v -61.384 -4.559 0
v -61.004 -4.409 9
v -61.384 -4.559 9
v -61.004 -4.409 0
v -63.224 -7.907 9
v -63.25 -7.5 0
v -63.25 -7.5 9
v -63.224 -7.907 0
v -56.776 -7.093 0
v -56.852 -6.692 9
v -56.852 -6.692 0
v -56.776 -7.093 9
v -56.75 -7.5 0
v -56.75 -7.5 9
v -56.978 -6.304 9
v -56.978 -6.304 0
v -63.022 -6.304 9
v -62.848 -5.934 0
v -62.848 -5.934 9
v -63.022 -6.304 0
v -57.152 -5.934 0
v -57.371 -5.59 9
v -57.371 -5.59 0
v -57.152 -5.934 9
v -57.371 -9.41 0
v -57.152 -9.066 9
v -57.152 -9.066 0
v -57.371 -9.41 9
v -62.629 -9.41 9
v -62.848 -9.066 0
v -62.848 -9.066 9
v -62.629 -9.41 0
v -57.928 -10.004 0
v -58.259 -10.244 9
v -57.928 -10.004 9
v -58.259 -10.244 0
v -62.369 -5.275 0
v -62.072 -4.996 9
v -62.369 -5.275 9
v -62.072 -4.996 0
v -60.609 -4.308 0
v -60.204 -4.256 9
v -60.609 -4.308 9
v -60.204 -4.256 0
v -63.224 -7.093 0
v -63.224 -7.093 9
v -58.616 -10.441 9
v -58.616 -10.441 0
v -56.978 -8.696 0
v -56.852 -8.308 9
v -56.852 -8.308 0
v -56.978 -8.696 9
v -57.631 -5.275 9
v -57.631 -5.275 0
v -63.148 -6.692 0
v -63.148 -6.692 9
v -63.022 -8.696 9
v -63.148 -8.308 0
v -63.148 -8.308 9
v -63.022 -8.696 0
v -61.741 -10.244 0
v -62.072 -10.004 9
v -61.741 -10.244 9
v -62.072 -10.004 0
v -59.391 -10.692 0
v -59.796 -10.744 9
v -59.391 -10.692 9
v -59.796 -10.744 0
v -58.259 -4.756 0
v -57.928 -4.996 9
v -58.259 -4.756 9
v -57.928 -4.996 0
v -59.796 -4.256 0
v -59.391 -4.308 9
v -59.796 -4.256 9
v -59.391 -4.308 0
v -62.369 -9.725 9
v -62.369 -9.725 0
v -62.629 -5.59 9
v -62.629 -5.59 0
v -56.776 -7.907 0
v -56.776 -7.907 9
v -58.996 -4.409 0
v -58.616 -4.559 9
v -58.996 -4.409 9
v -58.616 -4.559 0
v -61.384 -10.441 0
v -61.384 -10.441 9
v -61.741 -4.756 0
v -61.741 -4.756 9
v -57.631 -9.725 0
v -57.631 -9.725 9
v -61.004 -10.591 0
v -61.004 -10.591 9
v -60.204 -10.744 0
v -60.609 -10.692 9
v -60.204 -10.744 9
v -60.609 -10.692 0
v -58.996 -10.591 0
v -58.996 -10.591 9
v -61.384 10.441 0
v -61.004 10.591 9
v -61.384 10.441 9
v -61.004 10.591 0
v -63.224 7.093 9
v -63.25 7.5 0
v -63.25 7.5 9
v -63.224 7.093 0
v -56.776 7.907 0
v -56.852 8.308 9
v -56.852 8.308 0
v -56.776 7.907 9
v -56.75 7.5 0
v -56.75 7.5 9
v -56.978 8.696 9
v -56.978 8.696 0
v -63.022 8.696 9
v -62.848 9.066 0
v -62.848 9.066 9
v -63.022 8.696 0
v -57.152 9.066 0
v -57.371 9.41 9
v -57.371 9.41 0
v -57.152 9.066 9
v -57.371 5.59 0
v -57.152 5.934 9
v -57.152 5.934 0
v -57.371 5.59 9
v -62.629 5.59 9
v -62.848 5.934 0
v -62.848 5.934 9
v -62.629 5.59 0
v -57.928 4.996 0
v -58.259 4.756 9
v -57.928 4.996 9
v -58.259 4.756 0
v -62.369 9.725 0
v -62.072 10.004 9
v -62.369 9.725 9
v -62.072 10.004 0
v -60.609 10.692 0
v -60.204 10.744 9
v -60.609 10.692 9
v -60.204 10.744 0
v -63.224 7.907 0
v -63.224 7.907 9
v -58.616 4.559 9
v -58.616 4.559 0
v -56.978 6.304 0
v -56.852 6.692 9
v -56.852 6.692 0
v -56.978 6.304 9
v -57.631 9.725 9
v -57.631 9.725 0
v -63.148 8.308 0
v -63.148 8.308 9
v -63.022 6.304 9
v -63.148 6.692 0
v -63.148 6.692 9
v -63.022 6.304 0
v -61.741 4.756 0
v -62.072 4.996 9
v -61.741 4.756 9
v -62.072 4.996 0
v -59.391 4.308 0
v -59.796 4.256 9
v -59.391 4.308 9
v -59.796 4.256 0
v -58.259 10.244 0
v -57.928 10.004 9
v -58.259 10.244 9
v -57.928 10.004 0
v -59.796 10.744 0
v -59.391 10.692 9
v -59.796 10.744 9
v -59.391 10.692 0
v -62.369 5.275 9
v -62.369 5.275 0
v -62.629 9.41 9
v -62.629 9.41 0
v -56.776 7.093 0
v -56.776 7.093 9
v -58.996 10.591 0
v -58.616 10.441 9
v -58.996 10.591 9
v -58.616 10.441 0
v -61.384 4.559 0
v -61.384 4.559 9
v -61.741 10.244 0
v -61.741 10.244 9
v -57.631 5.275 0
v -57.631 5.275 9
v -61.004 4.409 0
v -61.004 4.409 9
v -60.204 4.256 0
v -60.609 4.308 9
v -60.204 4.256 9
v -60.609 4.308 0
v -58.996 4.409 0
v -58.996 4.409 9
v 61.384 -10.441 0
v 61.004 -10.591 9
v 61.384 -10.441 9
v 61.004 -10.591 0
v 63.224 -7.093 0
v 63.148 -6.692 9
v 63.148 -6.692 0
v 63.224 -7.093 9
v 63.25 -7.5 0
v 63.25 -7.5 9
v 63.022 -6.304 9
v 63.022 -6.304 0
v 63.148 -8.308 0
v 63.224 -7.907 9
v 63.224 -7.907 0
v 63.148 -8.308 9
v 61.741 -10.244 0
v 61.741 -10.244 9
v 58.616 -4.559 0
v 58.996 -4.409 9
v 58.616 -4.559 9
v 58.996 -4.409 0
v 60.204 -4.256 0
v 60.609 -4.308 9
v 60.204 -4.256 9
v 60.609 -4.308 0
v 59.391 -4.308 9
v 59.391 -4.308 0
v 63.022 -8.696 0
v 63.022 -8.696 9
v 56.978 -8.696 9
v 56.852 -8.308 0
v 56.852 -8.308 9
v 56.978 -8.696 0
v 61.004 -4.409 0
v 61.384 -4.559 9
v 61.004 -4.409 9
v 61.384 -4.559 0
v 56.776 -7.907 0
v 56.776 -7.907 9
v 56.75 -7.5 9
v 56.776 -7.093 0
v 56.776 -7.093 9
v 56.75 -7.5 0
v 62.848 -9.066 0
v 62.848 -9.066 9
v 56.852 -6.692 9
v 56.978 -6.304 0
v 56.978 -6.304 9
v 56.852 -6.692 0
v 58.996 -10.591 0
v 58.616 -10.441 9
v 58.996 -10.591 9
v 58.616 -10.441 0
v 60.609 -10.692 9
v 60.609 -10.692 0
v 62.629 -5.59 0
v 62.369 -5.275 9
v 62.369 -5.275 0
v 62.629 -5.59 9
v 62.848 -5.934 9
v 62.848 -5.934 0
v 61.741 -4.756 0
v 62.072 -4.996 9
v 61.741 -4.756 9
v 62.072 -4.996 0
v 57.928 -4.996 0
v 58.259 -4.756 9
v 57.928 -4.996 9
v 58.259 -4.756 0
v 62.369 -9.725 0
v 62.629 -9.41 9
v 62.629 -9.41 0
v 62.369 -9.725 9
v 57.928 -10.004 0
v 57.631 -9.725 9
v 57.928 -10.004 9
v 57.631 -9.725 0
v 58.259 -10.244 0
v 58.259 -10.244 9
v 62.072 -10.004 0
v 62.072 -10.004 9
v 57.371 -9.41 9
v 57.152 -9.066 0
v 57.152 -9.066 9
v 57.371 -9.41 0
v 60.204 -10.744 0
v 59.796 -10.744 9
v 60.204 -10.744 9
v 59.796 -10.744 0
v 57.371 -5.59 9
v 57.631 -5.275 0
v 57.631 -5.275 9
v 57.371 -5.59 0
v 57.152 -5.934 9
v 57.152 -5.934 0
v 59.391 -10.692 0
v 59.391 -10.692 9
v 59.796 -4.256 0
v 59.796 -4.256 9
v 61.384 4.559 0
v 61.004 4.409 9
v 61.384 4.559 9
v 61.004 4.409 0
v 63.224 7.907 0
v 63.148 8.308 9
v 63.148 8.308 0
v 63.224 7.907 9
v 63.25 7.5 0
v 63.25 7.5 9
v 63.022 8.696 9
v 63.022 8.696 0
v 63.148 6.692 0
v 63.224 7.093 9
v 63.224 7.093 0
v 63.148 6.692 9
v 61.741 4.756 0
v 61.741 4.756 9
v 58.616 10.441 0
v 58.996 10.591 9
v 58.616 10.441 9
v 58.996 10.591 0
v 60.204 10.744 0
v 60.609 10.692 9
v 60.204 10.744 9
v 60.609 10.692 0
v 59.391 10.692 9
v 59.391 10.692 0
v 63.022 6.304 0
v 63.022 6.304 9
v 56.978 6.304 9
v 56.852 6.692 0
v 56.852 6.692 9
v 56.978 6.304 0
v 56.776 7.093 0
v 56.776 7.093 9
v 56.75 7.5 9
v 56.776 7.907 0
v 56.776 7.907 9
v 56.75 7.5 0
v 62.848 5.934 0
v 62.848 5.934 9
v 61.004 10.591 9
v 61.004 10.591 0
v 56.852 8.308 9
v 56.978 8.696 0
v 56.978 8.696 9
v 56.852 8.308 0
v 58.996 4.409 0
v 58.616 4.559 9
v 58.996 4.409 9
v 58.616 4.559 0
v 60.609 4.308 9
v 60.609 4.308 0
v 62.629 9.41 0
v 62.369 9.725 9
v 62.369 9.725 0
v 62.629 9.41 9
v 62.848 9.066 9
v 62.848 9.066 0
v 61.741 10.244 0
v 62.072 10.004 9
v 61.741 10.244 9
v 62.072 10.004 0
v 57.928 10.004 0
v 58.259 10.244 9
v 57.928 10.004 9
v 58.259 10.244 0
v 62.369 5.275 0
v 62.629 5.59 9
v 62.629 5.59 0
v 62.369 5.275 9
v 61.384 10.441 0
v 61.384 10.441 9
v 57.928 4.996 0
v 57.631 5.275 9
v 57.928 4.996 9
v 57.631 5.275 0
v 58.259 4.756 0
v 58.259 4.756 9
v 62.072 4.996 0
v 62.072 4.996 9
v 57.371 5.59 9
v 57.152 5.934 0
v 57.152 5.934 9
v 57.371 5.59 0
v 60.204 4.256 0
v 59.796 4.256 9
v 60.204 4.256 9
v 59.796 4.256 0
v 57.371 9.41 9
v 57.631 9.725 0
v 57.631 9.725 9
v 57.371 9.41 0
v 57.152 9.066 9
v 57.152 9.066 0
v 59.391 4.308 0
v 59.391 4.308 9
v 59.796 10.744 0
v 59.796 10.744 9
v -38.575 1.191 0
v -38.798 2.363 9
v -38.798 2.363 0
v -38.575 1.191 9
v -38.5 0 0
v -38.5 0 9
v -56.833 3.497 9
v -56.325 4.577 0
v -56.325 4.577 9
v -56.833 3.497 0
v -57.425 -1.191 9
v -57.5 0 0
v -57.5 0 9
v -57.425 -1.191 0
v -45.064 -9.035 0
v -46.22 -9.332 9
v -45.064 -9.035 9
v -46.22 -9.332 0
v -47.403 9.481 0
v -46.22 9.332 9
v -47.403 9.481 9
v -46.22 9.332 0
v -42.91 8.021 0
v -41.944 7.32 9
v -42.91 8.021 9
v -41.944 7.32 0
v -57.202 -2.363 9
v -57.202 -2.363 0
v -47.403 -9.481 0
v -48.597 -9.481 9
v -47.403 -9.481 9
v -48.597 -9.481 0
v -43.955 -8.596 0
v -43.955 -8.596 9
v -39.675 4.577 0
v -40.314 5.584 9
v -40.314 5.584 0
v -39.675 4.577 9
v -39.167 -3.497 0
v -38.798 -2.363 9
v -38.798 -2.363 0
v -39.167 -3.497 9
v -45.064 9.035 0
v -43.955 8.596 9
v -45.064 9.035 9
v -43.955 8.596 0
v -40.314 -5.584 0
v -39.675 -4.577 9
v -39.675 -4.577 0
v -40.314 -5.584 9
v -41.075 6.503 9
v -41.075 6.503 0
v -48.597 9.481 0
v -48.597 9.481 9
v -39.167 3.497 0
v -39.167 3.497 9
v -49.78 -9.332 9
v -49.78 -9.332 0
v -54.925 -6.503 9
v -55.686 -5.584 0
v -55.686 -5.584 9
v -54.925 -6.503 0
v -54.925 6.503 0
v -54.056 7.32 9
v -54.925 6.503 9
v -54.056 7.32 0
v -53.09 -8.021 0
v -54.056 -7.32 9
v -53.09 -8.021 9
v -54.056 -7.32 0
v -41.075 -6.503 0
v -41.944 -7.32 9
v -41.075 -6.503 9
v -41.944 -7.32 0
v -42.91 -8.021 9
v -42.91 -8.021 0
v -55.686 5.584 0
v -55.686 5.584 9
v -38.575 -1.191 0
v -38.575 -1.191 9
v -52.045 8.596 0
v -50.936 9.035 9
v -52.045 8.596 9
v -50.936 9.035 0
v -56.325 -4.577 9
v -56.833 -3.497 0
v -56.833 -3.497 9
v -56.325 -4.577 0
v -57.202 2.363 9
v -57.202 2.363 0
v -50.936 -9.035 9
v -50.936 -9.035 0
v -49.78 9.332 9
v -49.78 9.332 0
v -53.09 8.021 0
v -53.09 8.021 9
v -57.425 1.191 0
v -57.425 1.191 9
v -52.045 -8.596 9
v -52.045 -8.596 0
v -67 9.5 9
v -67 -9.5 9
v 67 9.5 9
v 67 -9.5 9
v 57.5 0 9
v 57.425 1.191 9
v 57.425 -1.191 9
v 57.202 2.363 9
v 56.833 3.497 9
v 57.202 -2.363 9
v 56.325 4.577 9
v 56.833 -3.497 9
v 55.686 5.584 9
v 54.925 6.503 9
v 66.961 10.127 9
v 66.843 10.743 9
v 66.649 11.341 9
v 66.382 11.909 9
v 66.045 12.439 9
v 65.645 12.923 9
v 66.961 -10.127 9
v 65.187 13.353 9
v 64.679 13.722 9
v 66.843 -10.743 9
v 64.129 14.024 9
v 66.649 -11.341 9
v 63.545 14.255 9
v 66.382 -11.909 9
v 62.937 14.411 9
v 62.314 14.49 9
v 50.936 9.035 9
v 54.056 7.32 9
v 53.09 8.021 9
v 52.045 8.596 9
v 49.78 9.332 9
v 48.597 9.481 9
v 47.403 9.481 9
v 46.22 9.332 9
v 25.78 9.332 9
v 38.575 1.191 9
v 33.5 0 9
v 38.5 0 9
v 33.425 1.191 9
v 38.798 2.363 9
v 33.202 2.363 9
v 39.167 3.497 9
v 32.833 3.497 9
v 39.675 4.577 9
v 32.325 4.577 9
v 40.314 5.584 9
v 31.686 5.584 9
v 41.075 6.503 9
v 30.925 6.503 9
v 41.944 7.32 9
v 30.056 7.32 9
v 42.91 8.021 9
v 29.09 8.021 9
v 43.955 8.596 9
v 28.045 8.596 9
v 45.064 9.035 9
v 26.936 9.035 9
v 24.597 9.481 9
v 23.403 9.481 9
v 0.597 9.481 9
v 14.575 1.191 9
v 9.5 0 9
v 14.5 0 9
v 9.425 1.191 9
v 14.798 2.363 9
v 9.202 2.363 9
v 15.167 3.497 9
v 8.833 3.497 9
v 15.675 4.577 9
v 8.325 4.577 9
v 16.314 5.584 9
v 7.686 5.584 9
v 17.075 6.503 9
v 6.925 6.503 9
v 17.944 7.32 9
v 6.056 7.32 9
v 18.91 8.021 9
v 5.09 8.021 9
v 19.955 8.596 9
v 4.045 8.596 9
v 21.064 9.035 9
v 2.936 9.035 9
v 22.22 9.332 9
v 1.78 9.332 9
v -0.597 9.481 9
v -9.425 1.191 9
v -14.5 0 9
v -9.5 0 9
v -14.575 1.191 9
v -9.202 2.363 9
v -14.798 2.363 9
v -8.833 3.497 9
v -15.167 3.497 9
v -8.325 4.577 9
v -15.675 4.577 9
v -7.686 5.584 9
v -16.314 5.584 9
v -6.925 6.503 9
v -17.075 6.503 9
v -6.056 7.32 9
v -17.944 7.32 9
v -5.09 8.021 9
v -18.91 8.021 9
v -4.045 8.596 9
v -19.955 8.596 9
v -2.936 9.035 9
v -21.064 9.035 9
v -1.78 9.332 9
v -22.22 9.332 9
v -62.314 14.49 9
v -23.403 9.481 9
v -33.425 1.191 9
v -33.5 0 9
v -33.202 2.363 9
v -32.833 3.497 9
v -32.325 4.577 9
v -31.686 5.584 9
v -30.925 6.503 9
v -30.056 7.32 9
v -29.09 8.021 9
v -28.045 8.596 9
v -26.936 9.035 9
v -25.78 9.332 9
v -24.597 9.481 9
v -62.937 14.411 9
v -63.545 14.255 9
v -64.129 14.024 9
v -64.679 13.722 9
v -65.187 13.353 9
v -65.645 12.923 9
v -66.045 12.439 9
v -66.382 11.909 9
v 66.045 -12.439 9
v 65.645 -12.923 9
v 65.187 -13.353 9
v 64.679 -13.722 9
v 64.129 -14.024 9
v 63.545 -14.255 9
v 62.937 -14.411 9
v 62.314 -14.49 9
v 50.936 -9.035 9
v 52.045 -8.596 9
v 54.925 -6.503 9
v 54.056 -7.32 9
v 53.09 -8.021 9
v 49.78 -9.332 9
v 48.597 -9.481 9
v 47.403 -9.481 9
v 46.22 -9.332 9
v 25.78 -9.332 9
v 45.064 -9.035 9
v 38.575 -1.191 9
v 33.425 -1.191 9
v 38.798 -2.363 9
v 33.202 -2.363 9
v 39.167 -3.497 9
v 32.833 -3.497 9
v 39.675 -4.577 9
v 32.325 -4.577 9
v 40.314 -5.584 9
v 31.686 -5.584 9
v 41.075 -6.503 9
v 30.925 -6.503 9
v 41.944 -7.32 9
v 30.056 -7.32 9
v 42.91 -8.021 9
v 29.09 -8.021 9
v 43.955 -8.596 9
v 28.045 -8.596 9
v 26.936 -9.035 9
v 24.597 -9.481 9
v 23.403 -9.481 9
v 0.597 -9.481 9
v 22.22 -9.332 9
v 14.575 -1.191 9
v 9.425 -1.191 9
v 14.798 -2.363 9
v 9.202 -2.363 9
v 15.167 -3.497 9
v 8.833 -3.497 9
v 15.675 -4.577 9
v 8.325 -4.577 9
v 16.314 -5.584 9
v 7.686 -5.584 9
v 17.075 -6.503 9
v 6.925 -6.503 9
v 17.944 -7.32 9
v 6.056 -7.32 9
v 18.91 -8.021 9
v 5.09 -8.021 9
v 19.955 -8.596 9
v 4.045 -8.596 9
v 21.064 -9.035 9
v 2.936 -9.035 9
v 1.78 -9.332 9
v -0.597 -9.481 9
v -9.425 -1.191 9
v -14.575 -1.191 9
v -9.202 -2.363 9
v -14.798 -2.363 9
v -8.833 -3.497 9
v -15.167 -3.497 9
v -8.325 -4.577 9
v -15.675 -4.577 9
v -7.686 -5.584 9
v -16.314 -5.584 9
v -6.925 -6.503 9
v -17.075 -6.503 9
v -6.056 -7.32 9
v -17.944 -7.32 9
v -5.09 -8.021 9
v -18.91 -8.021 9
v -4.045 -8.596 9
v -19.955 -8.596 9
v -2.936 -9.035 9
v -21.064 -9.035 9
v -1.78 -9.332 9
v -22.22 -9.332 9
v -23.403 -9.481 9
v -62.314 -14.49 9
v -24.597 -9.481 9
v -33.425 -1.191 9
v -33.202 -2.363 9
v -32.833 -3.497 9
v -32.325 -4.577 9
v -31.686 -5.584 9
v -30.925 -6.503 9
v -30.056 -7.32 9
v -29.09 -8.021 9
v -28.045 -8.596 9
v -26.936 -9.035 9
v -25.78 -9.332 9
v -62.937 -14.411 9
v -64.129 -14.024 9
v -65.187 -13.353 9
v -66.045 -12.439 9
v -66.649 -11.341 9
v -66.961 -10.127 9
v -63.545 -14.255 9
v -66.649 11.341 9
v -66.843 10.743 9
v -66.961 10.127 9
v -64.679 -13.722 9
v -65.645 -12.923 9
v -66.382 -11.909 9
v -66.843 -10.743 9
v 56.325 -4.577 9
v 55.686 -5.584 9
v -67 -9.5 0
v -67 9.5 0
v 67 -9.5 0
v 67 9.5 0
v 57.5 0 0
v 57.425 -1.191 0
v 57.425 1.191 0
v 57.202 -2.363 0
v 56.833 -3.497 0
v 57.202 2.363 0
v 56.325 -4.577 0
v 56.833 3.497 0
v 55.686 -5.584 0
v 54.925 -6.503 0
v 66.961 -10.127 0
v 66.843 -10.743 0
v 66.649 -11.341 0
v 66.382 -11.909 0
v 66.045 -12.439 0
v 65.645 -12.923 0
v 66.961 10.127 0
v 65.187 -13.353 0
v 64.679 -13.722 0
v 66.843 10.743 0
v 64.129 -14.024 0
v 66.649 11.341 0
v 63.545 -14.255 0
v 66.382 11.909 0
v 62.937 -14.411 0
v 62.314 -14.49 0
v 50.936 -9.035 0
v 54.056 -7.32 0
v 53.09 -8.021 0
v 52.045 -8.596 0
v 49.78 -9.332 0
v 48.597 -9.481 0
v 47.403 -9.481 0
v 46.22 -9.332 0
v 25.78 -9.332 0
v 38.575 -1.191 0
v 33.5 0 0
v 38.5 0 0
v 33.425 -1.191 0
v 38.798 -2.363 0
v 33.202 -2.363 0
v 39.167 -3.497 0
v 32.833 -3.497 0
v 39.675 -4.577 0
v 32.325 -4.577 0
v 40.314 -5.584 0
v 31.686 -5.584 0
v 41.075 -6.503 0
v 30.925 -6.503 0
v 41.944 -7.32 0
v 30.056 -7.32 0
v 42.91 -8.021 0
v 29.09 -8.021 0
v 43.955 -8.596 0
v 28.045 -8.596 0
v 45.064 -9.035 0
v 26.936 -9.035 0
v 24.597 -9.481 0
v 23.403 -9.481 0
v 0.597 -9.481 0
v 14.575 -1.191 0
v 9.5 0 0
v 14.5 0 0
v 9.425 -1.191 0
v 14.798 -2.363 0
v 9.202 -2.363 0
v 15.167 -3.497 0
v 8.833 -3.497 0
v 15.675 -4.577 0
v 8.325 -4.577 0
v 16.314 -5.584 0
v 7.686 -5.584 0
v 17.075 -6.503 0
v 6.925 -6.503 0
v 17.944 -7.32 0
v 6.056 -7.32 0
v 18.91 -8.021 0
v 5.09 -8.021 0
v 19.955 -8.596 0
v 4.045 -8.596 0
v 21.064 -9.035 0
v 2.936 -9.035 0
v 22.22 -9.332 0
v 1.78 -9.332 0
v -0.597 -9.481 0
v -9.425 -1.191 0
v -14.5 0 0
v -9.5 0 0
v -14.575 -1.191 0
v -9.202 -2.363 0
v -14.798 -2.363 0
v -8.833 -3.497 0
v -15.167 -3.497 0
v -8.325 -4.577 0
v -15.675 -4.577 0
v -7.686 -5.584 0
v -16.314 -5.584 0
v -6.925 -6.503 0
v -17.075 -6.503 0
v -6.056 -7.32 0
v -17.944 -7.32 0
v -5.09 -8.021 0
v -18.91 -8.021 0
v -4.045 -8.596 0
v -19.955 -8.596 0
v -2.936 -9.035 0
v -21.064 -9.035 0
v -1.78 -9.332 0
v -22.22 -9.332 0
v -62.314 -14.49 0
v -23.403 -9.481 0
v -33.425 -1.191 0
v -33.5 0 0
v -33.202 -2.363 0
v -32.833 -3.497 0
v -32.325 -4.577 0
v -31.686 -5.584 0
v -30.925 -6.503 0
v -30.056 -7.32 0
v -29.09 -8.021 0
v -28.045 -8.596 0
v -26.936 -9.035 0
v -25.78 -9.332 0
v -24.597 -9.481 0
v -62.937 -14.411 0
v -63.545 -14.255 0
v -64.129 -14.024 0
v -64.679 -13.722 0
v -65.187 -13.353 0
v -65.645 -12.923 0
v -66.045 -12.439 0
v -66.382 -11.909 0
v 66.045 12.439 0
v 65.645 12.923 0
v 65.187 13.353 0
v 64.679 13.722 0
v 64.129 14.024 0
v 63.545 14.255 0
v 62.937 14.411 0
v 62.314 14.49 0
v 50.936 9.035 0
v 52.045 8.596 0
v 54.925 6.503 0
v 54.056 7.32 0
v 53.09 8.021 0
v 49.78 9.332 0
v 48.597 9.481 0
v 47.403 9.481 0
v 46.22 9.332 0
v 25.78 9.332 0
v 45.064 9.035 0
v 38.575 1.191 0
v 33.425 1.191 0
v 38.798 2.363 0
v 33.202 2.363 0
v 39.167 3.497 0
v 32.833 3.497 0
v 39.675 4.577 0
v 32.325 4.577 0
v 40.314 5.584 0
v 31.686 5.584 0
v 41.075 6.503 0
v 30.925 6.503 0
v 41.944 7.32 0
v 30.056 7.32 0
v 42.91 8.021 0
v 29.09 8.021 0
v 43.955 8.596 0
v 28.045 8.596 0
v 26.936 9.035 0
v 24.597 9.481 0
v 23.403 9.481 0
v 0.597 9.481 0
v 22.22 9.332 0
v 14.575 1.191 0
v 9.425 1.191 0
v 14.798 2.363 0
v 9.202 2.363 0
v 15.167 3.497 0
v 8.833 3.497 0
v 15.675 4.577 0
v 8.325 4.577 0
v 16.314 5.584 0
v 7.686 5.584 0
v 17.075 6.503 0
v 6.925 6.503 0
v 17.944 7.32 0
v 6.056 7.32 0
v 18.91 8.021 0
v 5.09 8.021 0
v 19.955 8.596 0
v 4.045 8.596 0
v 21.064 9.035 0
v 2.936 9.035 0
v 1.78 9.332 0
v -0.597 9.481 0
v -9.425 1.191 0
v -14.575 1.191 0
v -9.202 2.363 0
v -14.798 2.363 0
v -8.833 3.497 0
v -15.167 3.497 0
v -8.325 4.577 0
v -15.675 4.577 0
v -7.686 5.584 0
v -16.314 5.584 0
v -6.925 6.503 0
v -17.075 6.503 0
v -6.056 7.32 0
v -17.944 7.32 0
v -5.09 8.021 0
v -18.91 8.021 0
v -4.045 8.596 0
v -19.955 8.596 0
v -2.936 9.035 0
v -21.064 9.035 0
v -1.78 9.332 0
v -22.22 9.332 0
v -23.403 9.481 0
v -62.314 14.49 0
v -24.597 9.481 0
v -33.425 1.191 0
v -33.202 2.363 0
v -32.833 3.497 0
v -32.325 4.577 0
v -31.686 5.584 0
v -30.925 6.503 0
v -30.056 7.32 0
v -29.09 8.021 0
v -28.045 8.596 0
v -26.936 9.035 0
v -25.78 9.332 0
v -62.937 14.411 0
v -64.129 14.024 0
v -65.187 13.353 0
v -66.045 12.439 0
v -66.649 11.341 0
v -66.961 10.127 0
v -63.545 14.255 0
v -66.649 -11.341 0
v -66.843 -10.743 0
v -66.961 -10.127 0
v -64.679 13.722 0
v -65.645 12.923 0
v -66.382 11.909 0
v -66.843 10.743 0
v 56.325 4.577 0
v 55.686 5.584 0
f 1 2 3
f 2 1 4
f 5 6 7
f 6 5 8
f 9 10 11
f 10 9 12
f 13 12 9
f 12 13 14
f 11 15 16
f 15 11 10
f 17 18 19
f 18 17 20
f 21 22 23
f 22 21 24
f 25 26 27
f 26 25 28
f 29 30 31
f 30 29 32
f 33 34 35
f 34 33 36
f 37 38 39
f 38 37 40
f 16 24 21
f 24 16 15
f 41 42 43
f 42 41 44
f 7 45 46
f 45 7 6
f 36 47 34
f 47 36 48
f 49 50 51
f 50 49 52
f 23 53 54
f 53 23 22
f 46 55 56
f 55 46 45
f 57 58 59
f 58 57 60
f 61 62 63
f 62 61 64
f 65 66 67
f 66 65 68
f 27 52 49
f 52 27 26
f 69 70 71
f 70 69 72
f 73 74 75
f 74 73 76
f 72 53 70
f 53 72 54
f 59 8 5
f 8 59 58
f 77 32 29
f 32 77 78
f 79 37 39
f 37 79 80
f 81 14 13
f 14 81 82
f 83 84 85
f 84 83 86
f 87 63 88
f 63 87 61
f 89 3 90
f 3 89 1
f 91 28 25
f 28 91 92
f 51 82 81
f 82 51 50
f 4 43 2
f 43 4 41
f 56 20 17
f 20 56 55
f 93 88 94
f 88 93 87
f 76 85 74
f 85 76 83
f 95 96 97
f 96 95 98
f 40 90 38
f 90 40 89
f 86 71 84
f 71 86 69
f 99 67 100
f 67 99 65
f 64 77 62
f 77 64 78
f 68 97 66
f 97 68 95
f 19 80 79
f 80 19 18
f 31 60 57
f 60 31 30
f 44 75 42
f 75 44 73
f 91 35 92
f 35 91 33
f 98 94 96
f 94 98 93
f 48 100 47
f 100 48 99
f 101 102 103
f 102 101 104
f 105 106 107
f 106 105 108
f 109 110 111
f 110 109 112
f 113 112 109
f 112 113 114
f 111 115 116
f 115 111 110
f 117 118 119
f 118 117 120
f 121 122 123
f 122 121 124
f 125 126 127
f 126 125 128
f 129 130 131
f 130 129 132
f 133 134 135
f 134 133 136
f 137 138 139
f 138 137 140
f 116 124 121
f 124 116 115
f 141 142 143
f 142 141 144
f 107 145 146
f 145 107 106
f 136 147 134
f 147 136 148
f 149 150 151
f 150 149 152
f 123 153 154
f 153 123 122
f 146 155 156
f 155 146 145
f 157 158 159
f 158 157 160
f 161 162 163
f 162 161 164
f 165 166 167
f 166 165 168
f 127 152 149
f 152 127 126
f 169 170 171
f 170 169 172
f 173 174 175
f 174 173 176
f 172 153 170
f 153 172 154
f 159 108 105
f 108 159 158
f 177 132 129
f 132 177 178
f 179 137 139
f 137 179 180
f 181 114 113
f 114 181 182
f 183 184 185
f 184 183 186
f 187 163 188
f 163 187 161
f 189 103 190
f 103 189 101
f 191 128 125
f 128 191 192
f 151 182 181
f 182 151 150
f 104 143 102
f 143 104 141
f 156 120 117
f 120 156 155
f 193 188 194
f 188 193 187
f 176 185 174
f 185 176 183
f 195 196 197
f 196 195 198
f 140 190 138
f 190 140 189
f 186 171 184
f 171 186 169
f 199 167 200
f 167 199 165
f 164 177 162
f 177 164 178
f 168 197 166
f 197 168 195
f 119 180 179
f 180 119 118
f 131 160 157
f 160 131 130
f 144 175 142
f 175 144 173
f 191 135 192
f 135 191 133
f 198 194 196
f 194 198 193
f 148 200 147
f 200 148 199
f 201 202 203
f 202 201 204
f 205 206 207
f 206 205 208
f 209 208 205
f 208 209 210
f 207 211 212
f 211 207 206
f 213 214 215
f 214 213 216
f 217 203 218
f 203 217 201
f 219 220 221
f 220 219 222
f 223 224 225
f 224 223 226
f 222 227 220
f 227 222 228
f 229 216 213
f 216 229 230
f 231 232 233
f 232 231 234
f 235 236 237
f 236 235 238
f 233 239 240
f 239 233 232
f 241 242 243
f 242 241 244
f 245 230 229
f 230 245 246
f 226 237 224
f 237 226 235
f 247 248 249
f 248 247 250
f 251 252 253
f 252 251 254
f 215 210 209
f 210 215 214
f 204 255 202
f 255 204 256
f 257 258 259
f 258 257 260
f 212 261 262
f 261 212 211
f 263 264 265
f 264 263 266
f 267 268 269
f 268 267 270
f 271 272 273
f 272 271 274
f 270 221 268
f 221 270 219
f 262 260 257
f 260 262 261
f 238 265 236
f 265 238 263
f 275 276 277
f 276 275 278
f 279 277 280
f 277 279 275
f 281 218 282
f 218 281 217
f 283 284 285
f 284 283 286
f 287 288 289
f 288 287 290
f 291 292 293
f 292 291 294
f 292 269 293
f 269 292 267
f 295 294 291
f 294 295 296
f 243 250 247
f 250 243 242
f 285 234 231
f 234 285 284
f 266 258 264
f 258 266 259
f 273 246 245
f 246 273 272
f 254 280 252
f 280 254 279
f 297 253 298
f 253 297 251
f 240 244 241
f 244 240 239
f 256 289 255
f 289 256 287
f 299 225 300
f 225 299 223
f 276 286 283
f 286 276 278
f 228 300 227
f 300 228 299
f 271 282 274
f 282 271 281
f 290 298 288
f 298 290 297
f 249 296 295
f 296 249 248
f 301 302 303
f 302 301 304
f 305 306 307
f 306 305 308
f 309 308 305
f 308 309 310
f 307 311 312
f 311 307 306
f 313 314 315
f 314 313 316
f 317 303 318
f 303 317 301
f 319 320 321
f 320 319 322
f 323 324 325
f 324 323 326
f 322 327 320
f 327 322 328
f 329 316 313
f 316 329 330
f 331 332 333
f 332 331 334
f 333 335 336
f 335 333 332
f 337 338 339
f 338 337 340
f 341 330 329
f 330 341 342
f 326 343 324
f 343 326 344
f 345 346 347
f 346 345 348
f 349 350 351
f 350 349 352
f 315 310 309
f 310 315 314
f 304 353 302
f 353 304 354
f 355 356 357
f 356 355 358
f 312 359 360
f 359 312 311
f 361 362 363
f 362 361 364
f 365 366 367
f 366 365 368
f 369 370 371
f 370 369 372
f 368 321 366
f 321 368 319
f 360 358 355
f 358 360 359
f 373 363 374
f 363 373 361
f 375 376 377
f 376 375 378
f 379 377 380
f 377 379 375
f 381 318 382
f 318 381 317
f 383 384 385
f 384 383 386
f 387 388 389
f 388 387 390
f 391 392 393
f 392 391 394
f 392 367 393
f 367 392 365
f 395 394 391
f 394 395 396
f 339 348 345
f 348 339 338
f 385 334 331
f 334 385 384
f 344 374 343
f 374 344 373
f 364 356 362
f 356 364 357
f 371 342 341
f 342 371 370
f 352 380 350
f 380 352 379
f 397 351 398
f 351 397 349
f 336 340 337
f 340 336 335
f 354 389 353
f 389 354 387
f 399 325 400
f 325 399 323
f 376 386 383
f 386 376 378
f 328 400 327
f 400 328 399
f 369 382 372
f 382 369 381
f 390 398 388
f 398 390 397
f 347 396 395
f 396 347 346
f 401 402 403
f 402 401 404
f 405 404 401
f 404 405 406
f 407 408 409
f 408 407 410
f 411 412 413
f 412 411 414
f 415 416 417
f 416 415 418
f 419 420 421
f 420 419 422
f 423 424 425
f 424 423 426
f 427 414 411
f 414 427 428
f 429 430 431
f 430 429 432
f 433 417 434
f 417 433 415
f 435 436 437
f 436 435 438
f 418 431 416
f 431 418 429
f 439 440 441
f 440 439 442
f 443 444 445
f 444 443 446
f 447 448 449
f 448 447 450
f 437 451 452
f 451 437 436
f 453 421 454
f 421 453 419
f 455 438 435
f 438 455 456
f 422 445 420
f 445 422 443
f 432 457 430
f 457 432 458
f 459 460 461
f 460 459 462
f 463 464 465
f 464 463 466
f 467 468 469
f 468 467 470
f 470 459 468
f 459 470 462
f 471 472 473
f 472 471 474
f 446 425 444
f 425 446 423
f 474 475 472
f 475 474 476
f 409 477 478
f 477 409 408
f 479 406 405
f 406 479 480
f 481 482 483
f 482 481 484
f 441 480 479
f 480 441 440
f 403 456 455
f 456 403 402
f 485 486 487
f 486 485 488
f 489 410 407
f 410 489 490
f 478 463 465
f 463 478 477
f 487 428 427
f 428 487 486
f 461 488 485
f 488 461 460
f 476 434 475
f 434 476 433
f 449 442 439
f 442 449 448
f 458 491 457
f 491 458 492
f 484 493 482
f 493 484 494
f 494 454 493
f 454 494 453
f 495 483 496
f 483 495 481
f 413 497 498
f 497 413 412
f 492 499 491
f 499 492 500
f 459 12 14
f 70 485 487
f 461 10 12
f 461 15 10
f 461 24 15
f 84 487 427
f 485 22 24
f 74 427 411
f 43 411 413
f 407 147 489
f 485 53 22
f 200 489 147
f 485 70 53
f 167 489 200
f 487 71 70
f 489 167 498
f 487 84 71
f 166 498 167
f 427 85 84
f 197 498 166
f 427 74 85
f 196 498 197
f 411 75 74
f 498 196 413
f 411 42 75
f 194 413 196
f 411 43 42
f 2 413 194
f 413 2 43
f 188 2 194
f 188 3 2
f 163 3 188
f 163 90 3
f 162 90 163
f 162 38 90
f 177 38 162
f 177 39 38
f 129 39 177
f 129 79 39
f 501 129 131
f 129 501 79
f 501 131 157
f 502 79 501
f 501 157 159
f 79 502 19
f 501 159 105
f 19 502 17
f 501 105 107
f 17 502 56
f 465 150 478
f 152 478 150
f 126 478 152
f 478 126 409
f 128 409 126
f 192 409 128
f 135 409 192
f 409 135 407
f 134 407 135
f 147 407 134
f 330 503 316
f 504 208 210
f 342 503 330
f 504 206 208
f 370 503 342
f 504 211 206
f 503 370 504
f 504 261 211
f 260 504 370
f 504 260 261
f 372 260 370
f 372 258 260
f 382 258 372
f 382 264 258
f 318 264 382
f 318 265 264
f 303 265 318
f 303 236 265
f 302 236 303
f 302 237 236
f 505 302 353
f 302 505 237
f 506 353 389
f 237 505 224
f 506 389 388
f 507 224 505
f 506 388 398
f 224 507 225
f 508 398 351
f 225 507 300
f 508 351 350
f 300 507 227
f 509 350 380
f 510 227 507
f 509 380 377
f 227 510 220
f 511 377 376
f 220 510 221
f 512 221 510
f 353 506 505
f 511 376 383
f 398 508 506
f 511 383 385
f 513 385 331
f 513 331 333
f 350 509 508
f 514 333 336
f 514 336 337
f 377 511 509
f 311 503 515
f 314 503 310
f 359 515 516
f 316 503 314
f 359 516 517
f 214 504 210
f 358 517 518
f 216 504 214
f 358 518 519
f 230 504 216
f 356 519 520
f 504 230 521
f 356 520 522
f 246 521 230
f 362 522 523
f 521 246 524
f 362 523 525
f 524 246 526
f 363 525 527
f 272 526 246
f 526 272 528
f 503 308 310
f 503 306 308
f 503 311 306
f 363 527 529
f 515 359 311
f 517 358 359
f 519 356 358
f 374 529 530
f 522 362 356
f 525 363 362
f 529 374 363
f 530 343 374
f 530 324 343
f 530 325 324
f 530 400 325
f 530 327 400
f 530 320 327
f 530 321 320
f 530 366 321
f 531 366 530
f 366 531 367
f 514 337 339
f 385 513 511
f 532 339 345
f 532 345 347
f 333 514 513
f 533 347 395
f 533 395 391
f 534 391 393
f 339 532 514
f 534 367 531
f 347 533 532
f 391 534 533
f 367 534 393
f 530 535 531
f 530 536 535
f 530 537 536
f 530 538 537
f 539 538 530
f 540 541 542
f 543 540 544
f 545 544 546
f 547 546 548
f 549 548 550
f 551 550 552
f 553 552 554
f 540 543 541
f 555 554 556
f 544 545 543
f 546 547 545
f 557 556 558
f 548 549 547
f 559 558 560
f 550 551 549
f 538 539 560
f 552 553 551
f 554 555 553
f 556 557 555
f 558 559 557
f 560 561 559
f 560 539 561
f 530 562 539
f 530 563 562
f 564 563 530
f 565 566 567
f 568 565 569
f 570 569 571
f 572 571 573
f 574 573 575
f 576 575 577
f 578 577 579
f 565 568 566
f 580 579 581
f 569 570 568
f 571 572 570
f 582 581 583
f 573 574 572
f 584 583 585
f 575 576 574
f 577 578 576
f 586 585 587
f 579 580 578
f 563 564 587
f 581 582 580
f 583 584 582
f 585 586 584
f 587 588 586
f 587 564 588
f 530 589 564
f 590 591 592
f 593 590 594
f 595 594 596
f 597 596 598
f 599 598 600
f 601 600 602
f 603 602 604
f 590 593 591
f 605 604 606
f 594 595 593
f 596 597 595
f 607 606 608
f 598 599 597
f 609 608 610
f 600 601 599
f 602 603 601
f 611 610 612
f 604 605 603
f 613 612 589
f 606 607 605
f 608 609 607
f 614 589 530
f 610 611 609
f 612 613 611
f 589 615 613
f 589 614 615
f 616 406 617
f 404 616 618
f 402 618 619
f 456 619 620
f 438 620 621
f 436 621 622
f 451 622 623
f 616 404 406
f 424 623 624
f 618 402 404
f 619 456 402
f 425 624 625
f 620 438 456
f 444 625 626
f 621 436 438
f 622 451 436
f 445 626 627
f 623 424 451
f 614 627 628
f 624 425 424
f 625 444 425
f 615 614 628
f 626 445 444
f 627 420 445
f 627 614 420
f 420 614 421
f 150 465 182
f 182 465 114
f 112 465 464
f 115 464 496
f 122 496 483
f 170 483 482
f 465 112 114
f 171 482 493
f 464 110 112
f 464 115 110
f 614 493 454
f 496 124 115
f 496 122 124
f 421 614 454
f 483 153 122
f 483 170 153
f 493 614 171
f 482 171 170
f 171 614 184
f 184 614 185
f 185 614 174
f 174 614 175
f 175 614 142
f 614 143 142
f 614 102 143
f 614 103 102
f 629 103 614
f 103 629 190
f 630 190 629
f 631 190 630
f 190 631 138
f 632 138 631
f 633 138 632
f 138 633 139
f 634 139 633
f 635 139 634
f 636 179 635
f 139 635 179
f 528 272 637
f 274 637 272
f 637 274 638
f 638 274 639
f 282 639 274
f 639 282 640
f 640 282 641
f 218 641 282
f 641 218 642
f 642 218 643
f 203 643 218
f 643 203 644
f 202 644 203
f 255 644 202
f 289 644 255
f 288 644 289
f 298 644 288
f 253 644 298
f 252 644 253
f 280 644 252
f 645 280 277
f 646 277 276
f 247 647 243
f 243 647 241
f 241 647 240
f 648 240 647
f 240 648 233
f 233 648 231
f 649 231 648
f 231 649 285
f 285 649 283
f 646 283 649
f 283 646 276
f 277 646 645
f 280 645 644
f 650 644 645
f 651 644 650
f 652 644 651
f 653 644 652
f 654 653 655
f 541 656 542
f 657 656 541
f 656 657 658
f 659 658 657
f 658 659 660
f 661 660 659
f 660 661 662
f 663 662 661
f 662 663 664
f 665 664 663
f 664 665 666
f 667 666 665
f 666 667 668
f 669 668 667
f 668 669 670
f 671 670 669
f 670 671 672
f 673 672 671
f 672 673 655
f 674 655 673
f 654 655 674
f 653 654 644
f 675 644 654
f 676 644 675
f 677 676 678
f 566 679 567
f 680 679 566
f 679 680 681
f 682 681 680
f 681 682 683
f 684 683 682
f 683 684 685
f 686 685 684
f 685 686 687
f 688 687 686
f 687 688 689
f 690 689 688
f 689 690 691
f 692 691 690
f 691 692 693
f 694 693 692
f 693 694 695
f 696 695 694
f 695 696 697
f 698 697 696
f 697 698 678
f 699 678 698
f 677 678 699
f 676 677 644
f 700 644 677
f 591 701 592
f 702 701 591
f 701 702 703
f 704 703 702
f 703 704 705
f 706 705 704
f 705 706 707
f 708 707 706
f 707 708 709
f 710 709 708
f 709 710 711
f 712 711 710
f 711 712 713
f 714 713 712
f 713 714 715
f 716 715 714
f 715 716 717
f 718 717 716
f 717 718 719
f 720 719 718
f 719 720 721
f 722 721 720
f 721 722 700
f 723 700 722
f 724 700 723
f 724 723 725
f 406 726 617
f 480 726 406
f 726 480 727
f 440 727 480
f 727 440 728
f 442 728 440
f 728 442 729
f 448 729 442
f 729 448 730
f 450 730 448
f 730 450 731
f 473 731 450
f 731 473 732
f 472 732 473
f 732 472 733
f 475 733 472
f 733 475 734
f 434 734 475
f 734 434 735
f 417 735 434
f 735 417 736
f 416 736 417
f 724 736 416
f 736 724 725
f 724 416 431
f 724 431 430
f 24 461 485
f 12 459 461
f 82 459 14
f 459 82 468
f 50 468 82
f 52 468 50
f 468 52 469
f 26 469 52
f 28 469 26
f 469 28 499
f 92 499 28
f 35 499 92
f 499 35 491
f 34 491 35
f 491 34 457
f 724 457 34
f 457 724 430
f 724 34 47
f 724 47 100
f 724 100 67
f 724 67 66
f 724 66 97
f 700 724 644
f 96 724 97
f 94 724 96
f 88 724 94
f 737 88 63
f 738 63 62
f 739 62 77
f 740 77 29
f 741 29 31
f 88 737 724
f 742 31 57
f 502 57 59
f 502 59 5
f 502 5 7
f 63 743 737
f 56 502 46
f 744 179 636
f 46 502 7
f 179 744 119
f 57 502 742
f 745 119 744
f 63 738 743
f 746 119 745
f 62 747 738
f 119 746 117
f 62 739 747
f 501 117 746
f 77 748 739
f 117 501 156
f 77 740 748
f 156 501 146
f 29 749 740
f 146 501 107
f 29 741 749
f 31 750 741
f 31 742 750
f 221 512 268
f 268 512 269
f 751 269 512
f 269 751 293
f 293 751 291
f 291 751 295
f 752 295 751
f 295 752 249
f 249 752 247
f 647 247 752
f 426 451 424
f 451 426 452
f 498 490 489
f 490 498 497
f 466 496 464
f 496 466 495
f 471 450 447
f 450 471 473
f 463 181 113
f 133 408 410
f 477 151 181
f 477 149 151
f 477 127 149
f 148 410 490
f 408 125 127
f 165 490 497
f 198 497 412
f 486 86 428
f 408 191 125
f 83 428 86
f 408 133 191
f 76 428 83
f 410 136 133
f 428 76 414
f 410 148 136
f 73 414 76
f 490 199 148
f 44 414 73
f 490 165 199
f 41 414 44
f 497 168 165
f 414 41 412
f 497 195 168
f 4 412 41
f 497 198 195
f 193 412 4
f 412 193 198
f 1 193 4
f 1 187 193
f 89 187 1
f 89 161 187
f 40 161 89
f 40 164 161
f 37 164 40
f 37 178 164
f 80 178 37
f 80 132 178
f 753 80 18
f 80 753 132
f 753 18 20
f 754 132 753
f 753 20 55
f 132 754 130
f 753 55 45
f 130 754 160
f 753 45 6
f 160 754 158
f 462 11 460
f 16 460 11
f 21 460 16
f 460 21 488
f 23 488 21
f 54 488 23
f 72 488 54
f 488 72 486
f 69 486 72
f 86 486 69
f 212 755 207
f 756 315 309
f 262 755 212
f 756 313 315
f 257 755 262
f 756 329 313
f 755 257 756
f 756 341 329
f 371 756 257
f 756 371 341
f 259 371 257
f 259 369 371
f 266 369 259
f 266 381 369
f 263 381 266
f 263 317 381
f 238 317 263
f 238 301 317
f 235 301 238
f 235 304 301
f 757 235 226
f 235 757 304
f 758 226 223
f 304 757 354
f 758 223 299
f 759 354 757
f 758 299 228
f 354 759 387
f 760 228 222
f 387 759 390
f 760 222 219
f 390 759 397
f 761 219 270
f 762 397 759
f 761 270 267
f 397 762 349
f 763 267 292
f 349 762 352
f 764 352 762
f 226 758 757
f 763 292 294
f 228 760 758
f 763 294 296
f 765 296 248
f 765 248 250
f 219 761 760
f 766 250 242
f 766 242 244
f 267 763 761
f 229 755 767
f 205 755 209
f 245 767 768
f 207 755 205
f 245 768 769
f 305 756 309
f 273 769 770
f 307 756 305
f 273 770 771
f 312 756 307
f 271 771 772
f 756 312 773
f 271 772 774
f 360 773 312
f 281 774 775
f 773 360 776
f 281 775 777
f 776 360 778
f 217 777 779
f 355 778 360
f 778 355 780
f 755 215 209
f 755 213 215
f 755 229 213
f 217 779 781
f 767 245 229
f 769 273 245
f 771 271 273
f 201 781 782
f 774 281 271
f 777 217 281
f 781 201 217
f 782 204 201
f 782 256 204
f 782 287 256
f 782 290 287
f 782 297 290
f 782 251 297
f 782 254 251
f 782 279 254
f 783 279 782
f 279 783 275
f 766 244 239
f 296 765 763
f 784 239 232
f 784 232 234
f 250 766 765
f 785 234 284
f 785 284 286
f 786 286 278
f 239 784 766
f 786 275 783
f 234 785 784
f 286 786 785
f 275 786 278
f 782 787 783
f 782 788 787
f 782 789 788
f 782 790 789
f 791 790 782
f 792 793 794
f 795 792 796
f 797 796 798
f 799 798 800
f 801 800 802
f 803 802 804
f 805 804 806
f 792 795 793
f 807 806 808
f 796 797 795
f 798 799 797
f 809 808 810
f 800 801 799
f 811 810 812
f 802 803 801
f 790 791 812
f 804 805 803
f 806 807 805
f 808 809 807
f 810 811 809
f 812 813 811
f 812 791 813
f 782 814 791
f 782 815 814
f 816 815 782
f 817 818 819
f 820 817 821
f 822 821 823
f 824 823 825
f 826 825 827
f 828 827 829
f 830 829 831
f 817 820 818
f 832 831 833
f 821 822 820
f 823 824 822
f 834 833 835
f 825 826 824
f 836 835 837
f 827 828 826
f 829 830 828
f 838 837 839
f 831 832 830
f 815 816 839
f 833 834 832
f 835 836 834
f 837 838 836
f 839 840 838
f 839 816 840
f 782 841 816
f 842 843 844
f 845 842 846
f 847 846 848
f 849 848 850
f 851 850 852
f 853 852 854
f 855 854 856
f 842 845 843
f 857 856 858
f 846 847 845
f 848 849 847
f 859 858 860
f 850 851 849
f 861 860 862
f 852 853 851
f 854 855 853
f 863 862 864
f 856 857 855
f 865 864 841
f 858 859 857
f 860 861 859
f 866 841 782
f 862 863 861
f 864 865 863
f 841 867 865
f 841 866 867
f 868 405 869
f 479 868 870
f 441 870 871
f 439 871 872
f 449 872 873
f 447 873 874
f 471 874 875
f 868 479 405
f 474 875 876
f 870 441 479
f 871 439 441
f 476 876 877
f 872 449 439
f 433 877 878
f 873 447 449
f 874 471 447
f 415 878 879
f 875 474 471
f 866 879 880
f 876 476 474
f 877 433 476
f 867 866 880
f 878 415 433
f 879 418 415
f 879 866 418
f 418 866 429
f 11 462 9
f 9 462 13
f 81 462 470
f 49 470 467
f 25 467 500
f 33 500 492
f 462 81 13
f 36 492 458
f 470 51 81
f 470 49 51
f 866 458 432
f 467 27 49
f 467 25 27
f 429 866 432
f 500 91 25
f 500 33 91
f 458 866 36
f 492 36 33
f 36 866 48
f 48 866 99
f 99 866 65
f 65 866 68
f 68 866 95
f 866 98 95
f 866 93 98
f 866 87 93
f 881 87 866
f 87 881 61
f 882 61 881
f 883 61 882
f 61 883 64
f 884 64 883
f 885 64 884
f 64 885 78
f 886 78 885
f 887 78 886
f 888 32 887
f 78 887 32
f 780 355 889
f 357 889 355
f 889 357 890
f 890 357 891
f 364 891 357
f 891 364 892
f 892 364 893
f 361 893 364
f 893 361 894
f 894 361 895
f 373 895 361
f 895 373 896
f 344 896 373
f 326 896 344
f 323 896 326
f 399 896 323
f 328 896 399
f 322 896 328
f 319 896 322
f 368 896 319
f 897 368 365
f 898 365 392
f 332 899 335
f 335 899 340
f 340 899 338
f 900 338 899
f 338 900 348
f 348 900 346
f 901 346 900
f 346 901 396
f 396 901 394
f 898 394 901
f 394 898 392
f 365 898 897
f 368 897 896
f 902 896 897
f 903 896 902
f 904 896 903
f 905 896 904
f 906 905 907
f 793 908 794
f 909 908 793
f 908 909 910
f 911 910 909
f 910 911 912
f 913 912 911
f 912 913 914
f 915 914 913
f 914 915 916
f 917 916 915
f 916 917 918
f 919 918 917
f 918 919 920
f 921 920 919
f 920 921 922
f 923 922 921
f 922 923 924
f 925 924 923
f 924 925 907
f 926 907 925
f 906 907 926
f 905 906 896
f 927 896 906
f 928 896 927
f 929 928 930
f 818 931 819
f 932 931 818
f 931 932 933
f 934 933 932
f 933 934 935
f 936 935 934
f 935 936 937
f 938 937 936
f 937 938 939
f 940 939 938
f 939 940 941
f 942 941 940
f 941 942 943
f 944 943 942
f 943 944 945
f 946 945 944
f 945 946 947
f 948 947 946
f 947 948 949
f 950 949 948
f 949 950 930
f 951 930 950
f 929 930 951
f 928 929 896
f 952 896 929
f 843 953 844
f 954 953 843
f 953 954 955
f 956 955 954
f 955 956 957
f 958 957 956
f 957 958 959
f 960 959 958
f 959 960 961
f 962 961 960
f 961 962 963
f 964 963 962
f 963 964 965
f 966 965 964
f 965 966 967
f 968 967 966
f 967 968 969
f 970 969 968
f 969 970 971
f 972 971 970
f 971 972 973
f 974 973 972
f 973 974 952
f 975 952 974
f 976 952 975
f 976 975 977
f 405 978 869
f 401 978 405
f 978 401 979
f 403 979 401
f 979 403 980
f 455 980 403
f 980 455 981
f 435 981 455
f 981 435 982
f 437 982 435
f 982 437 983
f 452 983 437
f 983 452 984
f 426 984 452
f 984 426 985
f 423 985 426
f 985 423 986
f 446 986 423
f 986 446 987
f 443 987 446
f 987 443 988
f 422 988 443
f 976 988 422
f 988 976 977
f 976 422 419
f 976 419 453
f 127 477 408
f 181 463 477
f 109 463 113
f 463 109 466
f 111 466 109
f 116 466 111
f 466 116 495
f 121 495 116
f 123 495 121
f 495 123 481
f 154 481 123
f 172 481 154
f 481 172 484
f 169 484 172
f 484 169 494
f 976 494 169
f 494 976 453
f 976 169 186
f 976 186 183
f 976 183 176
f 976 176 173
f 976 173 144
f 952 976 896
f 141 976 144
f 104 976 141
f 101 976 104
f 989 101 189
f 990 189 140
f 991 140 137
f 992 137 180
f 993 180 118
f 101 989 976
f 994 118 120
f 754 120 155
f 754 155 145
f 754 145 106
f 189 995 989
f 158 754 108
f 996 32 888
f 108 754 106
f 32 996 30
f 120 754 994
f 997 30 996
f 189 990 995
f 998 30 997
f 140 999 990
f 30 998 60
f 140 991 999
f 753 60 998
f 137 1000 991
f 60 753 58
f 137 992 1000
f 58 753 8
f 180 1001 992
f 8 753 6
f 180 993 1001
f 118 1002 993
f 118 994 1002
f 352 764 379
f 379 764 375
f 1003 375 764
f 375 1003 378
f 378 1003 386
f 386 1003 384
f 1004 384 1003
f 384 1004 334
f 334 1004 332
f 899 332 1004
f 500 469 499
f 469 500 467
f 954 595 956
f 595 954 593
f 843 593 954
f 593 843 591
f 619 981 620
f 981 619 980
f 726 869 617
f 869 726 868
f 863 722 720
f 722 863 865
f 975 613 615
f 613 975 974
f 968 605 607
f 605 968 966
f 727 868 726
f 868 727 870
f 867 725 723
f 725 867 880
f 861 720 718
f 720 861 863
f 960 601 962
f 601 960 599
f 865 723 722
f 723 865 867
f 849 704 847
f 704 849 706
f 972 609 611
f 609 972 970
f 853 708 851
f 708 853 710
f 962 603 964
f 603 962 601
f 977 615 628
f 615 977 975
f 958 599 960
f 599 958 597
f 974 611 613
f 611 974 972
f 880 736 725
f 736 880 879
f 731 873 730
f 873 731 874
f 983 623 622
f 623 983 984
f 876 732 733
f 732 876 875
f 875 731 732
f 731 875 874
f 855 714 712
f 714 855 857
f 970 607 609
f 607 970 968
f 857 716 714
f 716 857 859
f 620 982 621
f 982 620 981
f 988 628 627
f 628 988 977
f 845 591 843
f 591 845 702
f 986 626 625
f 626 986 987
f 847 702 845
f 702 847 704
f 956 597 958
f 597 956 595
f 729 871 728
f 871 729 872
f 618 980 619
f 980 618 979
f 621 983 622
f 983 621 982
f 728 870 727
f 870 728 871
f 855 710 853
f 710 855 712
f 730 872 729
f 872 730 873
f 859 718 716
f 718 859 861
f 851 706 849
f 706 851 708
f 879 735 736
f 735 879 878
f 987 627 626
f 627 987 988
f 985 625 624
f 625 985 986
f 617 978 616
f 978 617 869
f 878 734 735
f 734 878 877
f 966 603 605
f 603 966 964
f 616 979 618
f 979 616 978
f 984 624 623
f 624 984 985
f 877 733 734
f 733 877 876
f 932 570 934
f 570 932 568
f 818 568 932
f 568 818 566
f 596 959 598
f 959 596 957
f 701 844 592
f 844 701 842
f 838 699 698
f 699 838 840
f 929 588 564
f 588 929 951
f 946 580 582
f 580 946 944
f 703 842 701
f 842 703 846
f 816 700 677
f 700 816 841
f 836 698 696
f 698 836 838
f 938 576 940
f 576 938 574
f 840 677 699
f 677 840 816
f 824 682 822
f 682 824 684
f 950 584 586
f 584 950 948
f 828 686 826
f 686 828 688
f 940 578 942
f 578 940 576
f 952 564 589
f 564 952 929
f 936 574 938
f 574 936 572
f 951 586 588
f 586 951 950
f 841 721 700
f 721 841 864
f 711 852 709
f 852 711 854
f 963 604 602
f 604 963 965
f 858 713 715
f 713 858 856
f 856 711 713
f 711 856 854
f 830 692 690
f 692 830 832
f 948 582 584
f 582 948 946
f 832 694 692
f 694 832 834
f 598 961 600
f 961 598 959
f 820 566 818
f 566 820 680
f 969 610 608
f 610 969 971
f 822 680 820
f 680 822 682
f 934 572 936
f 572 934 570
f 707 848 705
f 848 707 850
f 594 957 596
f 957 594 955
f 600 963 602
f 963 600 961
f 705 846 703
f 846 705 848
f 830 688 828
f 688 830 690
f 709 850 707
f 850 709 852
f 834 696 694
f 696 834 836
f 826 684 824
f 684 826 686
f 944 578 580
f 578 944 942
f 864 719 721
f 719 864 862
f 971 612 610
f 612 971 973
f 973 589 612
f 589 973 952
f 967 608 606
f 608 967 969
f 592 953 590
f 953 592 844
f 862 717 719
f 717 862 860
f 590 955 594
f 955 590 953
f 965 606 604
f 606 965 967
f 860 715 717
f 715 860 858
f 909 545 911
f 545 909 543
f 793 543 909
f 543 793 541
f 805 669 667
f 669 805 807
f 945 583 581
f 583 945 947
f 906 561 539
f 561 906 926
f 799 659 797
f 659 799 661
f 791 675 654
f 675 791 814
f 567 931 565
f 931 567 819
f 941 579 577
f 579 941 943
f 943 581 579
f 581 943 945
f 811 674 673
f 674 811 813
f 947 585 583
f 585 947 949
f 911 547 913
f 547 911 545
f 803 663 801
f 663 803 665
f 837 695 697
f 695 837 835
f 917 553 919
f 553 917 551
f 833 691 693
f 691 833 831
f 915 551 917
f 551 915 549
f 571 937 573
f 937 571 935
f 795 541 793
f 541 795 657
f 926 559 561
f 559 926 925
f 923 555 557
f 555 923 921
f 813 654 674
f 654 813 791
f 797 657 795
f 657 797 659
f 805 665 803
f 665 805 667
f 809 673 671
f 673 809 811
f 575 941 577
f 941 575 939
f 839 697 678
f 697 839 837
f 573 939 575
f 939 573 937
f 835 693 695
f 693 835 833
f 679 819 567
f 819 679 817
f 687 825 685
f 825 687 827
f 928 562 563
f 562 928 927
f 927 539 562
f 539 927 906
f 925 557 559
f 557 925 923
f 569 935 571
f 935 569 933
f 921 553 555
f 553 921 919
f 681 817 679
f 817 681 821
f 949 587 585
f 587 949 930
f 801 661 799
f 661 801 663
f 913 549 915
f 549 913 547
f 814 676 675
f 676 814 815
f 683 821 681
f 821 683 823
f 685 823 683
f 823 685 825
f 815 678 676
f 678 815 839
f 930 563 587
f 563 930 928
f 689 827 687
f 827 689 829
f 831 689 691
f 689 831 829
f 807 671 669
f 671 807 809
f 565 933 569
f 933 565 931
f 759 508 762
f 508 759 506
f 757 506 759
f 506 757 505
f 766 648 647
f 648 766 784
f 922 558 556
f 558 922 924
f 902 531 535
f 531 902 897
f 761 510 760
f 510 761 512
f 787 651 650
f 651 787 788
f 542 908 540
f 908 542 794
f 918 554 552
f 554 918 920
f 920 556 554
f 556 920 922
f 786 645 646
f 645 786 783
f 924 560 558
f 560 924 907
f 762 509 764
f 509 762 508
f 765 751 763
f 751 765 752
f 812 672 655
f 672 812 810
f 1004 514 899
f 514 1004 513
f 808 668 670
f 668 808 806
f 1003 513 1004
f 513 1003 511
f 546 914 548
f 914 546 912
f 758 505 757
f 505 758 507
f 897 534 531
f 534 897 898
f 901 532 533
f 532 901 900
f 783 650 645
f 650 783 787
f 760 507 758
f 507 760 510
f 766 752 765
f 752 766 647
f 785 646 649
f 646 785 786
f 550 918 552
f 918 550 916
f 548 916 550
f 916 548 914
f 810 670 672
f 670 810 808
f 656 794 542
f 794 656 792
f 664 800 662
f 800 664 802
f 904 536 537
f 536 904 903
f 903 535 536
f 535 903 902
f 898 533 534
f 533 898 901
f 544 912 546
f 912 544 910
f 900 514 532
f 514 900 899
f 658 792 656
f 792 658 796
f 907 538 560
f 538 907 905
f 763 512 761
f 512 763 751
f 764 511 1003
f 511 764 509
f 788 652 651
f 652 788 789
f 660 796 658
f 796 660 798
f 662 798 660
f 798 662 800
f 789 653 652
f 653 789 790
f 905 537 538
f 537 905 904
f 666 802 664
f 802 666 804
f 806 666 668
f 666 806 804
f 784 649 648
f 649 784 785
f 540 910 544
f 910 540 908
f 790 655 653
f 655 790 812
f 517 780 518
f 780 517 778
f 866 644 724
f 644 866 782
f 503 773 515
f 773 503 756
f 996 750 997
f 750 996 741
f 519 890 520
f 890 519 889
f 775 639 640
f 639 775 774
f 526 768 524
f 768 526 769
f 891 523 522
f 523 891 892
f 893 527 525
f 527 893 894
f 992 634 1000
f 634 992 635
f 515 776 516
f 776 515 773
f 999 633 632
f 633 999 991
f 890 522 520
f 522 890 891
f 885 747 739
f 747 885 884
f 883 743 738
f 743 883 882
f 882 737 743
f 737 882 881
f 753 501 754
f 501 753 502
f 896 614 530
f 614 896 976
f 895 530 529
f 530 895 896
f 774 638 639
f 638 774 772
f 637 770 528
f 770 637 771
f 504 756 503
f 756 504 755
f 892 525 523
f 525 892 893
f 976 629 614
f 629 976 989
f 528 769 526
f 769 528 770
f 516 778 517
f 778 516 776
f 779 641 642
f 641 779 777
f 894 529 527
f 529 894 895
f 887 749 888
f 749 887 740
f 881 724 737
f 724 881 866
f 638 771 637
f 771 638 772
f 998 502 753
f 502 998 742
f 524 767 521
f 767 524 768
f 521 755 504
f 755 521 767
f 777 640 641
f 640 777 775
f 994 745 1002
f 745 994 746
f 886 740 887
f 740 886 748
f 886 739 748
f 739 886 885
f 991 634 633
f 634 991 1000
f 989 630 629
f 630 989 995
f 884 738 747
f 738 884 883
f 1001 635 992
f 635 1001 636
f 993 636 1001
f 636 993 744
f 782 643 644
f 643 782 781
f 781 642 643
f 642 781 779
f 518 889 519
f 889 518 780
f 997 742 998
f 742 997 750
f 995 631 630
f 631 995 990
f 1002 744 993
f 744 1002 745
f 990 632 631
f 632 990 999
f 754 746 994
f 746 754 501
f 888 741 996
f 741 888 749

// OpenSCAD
$fn = 50;

difference() {
	union() {
		hull() {
			translate(v = [-62.0, 9.5, 0]) {
				cylinder(h = 9, r = 5);
			}
			translate(v = [62.0, 9.5, 0]) {
				cylinder(h = 9, r = 5);
			}
			translate(v = [-62.0, -9.5, 0]) {
				cylinder(h = 9, r = 5);
			}
			translate(v = [62.0, -9.5, 0]) {
				cylinder(h = 9, r = 5);
			}
		}
	}
	union() {
		translate(v = [-60.0, -7.5, -100.0]) {
			cylinder(h = 200, r = 3.25);
		}
		translate(v = [-60.0, 7.5, -100.0]) {
			cylinder(h = 200, r = 3.25);
		}
		translate(v = [60.0, -7.5, -100.0]) {
			cylinder(h = 200, r = 3.25);
		}
		translate(v = [60.0, 7.5, -100.0]) {
			cylinder(h = 200, r = 3.25);
		}
		translate(v = [-60.0, -7.5, -100.0]) {
			cylinder(h = 200, r = 1.8);
		}
		translate(v = [-60.0, 7.5, -100.0]) {
			cylinder(h = 200, r = 1.8);
		}
		translate(v = [60.0, -7.5, -100.0]) {
			cylinder(h = 200, r = 1.8);
		}
		translate(v = [60.0, 7.5, -100.0]) {
			cylinder(h = 200, r = 1.8);
		}
		translate(v = [-48.0, 0, 0.0]) {
			cylinder(h = 9, r = 9.5);
		}
		translate(v = [-24.0, 0, 0.0]) {
			cylinder(h = 9, r = 9.5);
		}
		cylinder(h = 9, r = 9.5);
		translate(v = [24.0, 0, 0.0]) {
			cylinder(h = 9, r = 9.5);
		}
		translate(v = [48.0, 0, 0.0]) {
			cylinder(h = 9, r = 9.5);
		}
	}
}
